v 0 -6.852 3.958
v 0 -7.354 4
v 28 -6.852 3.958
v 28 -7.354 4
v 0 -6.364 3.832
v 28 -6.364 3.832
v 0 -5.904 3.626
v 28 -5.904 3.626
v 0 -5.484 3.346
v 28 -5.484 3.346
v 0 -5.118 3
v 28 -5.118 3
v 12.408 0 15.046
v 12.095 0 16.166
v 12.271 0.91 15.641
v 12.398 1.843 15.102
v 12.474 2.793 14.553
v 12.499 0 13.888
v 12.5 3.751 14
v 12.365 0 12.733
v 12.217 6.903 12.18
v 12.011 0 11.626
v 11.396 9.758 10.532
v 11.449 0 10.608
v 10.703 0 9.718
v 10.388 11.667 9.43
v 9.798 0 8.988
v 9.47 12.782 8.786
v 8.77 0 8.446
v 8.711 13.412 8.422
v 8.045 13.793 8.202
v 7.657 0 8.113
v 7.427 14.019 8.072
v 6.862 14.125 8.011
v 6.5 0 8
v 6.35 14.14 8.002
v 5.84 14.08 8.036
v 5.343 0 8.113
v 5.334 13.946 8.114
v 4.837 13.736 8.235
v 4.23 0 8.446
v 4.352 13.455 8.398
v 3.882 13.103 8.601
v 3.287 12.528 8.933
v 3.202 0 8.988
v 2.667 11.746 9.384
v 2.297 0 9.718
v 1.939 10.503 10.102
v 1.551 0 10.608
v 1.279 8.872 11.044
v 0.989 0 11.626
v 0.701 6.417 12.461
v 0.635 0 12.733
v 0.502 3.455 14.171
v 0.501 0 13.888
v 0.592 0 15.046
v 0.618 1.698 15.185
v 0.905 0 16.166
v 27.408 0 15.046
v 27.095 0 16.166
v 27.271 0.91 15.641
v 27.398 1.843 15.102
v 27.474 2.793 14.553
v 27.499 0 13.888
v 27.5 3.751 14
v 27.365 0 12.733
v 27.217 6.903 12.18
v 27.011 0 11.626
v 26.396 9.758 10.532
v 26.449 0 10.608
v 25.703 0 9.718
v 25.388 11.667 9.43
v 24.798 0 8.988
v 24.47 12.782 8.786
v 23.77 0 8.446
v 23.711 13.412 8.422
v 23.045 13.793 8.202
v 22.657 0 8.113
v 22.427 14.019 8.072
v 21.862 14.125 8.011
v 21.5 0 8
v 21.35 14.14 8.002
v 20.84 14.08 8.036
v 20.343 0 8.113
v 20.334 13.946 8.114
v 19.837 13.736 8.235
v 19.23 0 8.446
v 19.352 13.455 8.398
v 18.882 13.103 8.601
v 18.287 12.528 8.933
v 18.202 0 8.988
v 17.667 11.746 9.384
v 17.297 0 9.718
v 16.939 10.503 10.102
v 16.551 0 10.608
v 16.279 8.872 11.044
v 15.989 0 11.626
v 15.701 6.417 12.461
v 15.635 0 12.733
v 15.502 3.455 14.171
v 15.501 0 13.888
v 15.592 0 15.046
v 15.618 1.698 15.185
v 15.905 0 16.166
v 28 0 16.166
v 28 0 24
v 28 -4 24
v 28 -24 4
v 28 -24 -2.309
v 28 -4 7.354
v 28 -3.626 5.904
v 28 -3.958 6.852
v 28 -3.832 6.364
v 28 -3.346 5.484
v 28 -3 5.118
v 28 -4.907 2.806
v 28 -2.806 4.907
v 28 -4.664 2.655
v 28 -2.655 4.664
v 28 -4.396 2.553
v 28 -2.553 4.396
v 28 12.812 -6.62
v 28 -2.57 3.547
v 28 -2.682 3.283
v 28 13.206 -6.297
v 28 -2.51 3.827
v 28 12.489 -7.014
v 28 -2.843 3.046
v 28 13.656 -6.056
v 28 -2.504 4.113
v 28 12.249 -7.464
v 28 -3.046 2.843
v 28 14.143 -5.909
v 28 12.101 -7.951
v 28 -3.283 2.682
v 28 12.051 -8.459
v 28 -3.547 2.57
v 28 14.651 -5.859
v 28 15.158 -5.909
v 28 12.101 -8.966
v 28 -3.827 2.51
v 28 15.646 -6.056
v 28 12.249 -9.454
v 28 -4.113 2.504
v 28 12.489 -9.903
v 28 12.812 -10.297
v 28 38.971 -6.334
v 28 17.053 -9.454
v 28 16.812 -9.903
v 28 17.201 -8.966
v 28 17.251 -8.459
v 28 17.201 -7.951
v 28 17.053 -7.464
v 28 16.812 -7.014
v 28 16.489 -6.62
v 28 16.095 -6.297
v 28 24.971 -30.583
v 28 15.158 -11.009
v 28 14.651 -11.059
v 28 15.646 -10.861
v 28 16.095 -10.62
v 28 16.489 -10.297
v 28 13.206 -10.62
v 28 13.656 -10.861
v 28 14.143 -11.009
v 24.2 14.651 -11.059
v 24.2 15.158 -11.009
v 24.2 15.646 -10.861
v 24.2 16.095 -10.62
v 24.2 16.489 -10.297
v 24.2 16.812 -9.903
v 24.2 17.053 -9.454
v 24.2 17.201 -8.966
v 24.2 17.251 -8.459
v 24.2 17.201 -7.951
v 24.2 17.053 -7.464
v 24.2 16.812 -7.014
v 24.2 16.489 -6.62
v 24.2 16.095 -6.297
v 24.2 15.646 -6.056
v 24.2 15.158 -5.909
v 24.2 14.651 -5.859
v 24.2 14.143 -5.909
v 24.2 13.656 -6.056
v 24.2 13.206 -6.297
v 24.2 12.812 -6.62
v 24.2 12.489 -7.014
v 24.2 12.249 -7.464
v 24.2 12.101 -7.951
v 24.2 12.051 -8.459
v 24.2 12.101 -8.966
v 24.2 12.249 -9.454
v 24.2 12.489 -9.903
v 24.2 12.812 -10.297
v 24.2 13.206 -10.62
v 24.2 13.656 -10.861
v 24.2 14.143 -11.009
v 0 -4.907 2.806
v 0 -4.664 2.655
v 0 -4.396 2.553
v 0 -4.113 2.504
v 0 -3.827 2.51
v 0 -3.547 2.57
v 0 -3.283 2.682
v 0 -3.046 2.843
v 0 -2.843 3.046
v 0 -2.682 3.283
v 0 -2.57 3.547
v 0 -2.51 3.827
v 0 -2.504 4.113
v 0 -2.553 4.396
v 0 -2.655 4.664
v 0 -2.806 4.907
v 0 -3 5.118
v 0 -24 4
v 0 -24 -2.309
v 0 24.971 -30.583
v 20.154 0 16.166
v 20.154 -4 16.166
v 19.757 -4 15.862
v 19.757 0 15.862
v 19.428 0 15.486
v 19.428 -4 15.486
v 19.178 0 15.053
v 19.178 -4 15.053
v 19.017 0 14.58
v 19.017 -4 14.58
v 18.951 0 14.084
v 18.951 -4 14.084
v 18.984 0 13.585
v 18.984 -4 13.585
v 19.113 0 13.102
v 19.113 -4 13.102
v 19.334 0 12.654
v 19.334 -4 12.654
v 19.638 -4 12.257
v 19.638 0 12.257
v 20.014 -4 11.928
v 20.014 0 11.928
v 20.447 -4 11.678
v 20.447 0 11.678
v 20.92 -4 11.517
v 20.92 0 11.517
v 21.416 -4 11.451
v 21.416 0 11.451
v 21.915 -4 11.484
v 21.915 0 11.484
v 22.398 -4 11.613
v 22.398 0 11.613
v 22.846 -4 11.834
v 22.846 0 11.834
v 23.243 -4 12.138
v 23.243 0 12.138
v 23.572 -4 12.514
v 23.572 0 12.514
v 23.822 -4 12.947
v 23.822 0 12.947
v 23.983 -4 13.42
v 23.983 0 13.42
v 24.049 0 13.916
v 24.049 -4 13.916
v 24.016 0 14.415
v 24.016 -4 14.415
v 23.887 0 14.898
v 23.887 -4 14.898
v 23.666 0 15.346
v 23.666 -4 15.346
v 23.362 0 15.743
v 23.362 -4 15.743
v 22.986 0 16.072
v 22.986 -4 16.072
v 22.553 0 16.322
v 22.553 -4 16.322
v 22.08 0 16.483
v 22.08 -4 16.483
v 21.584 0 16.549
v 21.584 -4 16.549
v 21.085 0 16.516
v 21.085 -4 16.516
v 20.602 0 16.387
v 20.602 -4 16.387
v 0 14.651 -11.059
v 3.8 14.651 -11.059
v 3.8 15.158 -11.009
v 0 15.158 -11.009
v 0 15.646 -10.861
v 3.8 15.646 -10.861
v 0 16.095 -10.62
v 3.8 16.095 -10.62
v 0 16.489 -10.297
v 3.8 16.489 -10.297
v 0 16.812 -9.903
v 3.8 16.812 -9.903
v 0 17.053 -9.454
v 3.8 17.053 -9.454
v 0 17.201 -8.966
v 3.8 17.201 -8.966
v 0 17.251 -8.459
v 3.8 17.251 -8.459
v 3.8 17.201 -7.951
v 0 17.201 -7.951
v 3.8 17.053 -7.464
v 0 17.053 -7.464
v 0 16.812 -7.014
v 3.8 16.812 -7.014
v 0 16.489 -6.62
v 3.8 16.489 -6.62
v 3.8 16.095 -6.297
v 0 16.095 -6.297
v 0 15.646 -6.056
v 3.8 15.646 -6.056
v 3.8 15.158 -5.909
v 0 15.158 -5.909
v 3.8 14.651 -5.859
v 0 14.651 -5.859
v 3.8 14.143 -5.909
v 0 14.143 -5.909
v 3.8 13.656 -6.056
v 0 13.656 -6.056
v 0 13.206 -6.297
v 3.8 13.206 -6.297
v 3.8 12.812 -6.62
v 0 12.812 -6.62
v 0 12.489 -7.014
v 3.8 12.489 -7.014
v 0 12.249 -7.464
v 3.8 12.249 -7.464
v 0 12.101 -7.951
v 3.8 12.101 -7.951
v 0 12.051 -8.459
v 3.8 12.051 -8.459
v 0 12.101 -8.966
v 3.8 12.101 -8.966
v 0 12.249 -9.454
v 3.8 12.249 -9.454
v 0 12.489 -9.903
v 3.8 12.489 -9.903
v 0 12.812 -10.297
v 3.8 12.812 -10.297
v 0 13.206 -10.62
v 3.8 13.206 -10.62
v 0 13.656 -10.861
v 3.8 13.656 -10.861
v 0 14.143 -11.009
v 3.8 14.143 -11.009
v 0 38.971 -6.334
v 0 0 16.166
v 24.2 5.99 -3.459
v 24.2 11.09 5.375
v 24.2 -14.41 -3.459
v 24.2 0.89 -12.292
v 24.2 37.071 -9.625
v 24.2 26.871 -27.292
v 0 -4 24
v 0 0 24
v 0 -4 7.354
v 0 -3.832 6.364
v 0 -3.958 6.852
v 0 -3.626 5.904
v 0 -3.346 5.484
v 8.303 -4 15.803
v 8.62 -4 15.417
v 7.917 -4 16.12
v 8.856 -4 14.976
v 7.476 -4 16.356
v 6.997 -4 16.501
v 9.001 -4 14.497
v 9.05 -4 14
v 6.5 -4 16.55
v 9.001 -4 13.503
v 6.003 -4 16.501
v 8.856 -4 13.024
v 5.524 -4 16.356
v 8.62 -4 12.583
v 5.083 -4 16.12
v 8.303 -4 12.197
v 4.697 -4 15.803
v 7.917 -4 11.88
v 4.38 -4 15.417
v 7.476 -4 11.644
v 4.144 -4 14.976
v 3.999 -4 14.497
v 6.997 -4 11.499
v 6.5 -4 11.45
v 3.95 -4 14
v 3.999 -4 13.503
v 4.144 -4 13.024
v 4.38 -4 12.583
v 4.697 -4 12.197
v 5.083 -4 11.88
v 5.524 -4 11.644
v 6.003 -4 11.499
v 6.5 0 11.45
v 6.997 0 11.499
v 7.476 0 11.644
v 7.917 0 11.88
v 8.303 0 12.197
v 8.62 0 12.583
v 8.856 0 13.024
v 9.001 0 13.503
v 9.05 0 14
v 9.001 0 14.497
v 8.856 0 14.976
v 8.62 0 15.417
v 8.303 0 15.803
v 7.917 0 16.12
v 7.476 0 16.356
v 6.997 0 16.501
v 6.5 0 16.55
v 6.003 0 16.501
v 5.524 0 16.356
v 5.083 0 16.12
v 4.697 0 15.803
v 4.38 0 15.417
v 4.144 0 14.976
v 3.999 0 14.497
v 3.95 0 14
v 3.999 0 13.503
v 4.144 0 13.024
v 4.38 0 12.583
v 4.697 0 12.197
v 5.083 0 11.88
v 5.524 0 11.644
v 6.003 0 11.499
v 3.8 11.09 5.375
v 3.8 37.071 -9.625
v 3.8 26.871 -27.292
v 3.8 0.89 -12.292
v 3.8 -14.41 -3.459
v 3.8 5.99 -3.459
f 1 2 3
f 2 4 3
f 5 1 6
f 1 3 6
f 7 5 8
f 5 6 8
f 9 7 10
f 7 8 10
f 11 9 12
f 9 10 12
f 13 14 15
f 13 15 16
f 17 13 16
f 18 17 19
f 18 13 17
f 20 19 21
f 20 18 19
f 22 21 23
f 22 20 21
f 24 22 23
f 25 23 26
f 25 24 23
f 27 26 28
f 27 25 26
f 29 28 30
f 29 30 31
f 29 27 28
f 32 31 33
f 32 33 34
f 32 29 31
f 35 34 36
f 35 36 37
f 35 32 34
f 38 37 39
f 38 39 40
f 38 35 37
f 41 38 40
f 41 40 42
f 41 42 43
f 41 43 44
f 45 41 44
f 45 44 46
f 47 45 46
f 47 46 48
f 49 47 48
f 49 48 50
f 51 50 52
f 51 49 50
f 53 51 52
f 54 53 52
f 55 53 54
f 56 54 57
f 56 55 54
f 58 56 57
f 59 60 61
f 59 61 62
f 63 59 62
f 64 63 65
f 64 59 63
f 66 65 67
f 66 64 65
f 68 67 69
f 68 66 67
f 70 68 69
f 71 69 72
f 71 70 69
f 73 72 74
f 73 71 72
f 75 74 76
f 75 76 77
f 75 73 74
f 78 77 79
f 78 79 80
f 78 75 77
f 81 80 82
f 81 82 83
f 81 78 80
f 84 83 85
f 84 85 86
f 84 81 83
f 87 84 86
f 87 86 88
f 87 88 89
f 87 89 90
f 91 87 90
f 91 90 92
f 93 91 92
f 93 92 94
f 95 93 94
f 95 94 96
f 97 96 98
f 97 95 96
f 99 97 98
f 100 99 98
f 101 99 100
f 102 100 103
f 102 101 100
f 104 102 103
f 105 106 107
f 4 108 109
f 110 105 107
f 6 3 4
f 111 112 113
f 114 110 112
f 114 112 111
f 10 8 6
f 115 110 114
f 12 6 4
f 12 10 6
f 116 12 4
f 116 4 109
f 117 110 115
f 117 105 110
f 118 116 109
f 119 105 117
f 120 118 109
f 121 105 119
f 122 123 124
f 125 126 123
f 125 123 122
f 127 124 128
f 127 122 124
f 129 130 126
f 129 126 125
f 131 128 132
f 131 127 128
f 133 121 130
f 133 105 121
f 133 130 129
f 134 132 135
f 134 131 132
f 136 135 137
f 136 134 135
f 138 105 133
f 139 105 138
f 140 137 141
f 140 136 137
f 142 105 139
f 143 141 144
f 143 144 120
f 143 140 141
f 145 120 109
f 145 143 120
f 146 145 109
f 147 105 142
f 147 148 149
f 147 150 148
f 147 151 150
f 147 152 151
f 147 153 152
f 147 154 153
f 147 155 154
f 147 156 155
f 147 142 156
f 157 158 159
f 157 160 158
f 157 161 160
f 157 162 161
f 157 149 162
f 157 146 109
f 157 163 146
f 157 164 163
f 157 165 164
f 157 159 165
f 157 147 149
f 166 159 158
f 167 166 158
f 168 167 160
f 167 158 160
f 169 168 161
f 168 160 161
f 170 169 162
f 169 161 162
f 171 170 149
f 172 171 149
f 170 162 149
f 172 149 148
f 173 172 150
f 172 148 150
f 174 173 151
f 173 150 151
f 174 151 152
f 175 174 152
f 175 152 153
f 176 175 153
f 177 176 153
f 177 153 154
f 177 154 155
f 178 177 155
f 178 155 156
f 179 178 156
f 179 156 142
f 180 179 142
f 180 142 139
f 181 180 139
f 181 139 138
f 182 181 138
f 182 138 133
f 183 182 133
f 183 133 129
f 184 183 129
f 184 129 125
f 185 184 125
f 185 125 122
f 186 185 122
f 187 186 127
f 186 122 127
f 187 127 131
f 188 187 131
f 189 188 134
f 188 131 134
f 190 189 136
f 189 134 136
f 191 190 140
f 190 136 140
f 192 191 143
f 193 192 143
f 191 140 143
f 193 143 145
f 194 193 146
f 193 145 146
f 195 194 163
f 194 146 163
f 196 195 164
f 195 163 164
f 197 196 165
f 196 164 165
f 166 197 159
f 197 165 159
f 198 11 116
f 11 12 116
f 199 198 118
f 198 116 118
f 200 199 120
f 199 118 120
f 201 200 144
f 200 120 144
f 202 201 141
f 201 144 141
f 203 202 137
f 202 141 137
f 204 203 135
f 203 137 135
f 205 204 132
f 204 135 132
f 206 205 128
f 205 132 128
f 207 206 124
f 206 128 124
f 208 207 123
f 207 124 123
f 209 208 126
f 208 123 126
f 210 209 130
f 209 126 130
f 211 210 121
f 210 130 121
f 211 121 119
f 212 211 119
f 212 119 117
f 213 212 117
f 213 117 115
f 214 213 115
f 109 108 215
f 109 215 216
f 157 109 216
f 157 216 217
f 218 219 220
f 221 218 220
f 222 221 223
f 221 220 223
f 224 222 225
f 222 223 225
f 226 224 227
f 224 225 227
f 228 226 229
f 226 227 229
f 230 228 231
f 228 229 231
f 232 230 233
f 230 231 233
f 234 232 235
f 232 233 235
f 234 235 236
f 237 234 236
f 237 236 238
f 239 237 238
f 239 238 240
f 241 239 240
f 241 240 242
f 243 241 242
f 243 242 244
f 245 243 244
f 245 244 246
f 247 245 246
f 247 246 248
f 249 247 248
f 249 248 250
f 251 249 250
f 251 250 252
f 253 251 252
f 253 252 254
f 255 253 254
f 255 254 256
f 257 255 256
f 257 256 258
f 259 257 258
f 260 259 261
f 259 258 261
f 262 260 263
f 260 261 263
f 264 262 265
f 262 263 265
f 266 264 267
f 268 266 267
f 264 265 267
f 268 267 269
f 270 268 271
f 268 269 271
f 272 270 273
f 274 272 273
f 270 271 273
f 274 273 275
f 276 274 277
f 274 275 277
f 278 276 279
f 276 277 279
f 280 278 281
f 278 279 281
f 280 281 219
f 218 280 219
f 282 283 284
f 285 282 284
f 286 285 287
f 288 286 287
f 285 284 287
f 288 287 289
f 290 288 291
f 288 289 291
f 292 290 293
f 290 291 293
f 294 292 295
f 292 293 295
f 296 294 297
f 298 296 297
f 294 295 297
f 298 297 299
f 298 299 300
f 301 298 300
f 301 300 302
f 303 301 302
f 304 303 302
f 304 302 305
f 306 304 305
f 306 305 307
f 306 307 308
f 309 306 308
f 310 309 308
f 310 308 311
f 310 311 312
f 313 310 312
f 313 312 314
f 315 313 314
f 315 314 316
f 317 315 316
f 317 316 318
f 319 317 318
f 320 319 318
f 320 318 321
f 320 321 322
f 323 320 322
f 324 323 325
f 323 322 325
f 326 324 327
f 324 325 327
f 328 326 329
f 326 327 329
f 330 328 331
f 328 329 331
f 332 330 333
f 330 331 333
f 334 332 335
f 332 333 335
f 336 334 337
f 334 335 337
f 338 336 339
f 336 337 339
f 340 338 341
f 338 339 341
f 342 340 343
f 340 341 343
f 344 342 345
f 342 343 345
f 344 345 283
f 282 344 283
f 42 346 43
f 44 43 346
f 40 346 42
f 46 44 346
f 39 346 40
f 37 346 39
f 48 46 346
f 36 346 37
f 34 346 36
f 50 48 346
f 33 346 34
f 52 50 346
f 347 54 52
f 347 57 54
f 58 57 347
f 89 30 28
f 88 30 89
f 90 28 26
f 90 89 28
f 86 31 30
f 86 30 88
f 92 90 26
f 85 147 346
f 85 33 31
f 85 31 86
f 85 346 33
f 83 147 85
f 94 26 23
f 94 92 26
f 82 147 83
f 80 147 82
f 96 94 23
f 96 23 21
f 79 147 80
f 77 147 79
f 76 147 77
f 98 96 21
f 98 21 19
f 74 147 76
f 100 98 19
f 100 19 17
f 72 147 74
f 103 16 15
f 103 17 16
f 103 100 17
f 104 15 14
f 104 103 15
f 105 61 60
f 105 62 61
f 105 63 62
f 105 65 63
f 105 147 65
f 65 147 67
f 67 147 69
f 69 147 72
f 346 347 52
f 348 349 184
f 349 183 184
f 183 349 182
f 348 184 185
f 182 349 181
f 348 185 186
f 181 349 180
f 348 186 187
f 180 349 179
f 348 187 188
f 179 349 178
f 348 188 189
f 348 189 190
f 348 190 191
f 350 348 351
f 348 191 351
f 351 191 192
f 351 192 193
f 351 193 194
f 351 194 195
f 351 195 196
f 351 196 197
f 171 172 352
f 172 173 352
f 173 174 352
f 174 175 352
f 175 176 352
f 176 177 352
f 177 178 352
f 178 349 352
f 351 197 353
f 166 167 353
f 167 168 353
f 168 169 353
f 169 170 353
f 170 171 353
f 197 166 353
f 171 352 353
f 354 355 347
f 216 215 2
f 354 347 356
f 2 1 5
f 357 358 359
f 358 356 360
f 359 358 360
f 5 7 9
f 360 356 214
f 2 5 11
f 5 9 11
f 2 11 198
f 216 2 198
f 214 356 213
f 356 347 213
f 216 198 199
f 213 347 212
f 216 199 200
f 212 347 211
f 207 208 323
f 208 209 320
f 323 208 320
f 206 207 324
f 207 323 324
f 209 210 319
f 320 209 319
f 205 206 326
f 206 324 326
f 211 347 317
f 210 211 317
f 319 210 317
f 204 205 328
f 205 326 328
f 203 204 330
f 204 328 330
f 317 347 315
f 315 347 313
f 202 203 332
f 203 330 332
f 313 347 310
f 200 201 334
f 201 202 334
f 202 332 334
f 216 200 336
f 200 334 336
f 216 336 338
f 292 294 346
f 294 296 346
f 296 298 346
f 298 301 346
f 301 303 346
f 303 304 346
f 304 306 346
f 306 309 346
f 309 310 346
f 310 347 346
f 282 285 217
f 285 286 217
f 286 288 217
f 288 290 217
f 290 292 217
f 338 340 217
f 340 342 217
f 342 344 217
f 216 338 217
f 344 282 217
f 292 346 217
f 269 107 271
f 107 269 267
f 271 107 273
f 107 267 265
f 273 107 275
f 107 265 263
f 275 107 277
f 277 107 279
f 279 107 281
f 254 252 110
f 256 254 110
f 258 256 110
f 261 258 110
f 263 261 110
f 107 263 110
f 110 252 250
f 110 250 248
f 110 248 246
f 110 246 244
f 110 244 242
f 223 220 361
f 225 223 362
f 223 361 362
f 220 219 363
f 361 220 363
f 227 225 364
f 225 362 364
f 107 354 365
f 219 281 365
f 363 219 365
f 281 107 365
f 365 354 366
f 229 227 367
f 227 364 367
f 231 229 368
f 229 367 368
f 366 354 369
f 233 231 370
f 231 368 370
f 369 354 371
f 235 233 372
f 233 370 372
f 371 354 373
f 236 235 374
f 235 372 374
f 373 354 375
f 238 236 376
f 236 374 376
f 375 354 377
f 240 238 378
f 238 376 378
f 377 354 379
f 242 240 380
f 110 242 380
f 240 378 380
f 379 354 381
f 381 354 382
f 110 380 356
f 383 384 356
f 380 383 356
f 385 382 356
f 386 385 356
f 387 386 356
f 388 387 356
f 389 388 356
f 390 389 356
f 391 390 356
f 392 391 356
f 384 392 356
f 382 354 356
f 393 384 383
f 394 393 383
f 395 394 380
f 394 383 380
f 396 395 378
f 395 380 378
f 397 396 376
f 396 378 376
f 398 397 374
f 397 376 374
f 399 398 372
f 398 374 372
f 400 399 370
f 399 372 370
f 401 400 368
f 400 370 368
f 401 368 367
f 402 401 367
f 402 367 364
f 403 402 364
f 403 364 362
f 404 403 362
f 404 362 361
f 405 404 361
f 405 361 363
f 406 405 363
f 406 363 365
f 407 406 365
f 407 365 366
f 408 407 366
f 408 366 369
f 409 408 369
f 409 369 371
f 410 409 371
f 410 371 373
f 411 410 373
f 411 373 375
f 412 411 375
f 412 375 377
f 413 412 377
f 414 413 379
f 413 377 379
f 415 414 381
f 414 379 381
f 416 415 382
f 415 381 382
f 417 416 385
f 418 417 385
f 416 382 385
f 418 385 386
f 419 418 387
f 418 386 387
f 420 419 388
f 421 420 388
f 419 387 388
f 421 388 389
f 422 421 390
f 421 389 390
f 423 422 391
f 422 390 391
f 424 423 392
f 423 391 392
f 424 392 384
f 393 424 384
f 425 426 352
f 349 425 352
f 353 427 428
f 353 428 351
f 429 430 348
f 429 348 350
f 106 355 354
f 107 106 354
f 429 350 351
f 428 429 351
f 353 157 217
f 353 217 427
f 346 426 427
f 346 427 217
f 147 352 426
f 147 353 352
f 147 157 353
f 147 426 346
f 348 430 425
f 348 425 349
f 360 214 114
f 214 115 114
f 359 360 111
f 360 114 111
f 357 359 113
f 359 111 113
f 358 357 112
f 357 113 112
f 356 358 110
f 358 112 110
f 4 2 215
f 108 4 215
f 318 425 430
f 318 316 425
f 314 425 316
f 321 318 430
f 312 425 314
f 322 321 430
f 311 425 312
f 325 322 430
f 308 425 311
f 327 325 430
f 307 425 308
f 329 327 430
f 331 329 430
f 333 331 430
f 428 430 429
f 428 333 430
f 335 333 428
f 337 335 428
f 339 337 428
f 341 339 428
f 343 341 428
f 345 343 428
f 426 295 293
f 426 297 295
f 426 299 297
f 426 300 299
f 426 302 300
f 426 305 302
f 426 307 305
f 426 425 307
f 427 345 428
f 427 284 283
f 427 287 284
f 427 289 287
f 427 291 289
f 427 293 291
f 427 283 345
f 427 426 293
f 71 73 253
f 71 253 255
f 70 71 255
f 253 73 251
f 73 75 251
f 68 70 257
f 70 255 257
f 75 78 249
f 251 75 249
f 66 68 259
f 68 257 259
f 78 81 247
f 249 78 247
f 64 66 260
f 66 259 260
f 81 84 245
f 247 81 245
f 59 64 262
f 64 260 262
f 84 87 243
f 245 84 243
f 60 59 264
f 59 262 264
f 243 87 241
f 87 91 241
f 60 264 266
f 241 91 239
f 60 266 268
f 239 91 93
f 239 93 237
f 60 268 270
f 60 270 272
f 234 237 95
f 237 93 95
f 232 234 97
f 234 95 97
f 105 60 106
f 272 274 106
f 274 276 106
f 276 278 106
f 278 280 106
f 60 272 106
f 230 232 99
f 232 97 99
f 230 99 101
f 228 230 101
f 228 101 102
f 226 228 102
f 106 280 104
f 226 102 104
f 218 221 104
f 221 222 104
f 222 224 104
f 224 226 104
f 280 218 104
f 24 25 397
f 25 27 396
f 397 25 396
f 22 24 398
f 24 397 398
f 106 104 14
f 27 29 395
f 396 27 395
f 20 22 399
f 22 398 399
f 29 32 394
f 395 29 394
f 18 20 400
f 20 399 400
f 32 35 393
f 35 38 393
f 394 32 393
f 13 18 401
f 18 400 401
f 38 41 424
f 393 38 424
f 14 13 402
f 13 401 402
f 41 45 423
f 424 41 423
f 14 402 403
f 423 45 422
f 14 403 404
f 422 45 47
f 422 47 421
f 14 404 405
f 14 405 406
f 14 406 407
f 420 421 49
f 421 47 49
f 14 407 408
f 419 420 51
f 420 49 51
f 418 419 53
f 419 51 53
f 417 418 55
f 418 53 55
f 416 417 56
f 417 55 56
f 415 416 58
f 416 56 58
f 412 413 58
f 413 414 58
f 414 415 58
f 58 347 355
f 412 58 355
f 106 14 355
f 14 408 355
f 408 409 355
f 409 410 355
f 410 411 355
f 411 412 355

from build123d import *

# Parameters (mm, degrees)
BOSS_EXTRUDE1_DEPTH = 28
BOSS_EXTRUDE2_DEPTH = 28
SKETCH3_R           = 2.55
CUT_EXTRUDE1_DEPTH  = 60.714597447
SKETCH4_R           = 6
CUT_EXTRUDE2_DEPTH  = 28
SKETCH5_W           = 20.4
SKETCH5_H           = 20.4
CUT_EXTRUDE3_DEPTH  = 30
CUT_EXTRUDE4_DEPTH  = 20.4
SKETCH7_R           = 2.6
CUT_EXTRUDE5_DEPTH  = 57.903989341
SKETCH8_R           = 1.5
CUT_EXTRUDE6_DEPTH  = 57.903989341
FILLET2_R           = 3


with BuildPart() as part:
    # Sketch1 → Boss-Extrude1 (new body)
    with BuildSketch(Plane(origin=(0, 0, 0), x_dir=(0, 0, -1), z_dir=(1, 0, 0))):
        Polygon((0, 0), (-24, 0), (-24, -4), (-4, -4), (-4, -24), (0, -24), align=None)
    extrude(amount=BOSS_EXTRUDE1_DEPTH)

    # Sketch2 → Boss-Extrude2 (add)
    with BuildSketch(Plane(origin=(28, 0, 0), x_dir=(0, 0, -1), z_dir=(1, 0, 0))):
        Polygon((2.309401077, -24), (30.582903769, 24.97114317), (6.334192463, 38.97114317), (-16.165807537, 0), (0, 0), (0, -24), align=None)
    extrude(amount=-BOSS_EXTRUDE2_DEPTH)

    # Sketch3 → Cut-Extrude1 (cut, through all)
    with BuildSketch(Plane.XZ.offset(4)):
        with Locations(Location((6.5, 14, 0), (0, 0, 270))):
            Circle(SKETCH3_R)
        with Locations(Location((21.5, 14, 0), (0, 0, 121.860446245))):
            Circle(SKETCH3_R)
    extrude(amount=-CUT_EXTRUDE1_DEPTH, mode=Mode.SUBTRACT)

    # Sketch4 → Cut-Extrude2 (cut)
    with BuildSketch(Plane(origin=(0, 0, 0), x_dir=(1, 0, 0), z_dir=(0, 1, 0))):
        with Locations((6.5, -14)):
            Circle(SKETCH4_R)
        with Locations((21.5, -14)):
            Circle(SKETCH4_R)
    extrude(amount=CUT_EXTRUDE2_DEPTH, mode=Mode.SUBTRACT)

    # Sketch5 → Cut-Extrude3 (cut)
    with BuildSketch(Plane(origin=(0, 31.97114317, -18.458548116), x_dir=(1, 0, 0), z_dir=(0, 0.8660254037844402, -0.49999999999999767))):
        with Locations((14, 0)):
            Rectangle(SKETCH5_W, SKETCH5_H)
    extrude(amount=-CUT_EXTRUDE3_DEPTH, mode=Mode.SUBTRACT)

    # Sketch6 → Cut-Extrude4 (cut)
    with BuildSketch(Plane(origin=(3.8, 0, 0), x_dir=(0, 0, -1), z_dir=(1, 0, 0))):
        Polygon((12.292007234, 0.890381057), (3.458548116, 5.990381057), (3.458548116, -14.409618943), align=None)
    extrude(amount=CUT_EXTRUDE4_DEPTH, mode=Mode.SUBTRACT)

    # Sketch7 → Cut-Extrude5 (cut, through all)
    with BuildSketch(Plane(origin=(28, 0, 0), x_dir=(0, 0, -1), z_dir=(1, 0, 0))):
        with Locations((8.458548116, 14.650635095)):
            Circle(SKETCH7_R)
    extrude(amount=-CUT_EXTRUDE5_DEPTH, mode=Mode.SUBTRACT)

    # Sketch8 → Cut-Extrude6 (cut, through all)
    with BuildSketch(Plane(origin=(28, 0, 0), x_dir=(0, 0, -1), z_dir=(1, 0, 0))):
        with Locations((-4, -4)):
            Circle(SKETCH8_R)
    extrude(amount=-CUT_EXTRUDE6_DEPTH, mode=Mode.SUBTRACT)

    # Fillet2
    fillet2_edges = [part.edges().sort_by_distance(p)[0] for p in [
        (14, -4, 5.5),
        (14, -5.5, 4),
    ]]
    fillet(fillet2_edges, radius=FILLET2_R)


solid = part.part
